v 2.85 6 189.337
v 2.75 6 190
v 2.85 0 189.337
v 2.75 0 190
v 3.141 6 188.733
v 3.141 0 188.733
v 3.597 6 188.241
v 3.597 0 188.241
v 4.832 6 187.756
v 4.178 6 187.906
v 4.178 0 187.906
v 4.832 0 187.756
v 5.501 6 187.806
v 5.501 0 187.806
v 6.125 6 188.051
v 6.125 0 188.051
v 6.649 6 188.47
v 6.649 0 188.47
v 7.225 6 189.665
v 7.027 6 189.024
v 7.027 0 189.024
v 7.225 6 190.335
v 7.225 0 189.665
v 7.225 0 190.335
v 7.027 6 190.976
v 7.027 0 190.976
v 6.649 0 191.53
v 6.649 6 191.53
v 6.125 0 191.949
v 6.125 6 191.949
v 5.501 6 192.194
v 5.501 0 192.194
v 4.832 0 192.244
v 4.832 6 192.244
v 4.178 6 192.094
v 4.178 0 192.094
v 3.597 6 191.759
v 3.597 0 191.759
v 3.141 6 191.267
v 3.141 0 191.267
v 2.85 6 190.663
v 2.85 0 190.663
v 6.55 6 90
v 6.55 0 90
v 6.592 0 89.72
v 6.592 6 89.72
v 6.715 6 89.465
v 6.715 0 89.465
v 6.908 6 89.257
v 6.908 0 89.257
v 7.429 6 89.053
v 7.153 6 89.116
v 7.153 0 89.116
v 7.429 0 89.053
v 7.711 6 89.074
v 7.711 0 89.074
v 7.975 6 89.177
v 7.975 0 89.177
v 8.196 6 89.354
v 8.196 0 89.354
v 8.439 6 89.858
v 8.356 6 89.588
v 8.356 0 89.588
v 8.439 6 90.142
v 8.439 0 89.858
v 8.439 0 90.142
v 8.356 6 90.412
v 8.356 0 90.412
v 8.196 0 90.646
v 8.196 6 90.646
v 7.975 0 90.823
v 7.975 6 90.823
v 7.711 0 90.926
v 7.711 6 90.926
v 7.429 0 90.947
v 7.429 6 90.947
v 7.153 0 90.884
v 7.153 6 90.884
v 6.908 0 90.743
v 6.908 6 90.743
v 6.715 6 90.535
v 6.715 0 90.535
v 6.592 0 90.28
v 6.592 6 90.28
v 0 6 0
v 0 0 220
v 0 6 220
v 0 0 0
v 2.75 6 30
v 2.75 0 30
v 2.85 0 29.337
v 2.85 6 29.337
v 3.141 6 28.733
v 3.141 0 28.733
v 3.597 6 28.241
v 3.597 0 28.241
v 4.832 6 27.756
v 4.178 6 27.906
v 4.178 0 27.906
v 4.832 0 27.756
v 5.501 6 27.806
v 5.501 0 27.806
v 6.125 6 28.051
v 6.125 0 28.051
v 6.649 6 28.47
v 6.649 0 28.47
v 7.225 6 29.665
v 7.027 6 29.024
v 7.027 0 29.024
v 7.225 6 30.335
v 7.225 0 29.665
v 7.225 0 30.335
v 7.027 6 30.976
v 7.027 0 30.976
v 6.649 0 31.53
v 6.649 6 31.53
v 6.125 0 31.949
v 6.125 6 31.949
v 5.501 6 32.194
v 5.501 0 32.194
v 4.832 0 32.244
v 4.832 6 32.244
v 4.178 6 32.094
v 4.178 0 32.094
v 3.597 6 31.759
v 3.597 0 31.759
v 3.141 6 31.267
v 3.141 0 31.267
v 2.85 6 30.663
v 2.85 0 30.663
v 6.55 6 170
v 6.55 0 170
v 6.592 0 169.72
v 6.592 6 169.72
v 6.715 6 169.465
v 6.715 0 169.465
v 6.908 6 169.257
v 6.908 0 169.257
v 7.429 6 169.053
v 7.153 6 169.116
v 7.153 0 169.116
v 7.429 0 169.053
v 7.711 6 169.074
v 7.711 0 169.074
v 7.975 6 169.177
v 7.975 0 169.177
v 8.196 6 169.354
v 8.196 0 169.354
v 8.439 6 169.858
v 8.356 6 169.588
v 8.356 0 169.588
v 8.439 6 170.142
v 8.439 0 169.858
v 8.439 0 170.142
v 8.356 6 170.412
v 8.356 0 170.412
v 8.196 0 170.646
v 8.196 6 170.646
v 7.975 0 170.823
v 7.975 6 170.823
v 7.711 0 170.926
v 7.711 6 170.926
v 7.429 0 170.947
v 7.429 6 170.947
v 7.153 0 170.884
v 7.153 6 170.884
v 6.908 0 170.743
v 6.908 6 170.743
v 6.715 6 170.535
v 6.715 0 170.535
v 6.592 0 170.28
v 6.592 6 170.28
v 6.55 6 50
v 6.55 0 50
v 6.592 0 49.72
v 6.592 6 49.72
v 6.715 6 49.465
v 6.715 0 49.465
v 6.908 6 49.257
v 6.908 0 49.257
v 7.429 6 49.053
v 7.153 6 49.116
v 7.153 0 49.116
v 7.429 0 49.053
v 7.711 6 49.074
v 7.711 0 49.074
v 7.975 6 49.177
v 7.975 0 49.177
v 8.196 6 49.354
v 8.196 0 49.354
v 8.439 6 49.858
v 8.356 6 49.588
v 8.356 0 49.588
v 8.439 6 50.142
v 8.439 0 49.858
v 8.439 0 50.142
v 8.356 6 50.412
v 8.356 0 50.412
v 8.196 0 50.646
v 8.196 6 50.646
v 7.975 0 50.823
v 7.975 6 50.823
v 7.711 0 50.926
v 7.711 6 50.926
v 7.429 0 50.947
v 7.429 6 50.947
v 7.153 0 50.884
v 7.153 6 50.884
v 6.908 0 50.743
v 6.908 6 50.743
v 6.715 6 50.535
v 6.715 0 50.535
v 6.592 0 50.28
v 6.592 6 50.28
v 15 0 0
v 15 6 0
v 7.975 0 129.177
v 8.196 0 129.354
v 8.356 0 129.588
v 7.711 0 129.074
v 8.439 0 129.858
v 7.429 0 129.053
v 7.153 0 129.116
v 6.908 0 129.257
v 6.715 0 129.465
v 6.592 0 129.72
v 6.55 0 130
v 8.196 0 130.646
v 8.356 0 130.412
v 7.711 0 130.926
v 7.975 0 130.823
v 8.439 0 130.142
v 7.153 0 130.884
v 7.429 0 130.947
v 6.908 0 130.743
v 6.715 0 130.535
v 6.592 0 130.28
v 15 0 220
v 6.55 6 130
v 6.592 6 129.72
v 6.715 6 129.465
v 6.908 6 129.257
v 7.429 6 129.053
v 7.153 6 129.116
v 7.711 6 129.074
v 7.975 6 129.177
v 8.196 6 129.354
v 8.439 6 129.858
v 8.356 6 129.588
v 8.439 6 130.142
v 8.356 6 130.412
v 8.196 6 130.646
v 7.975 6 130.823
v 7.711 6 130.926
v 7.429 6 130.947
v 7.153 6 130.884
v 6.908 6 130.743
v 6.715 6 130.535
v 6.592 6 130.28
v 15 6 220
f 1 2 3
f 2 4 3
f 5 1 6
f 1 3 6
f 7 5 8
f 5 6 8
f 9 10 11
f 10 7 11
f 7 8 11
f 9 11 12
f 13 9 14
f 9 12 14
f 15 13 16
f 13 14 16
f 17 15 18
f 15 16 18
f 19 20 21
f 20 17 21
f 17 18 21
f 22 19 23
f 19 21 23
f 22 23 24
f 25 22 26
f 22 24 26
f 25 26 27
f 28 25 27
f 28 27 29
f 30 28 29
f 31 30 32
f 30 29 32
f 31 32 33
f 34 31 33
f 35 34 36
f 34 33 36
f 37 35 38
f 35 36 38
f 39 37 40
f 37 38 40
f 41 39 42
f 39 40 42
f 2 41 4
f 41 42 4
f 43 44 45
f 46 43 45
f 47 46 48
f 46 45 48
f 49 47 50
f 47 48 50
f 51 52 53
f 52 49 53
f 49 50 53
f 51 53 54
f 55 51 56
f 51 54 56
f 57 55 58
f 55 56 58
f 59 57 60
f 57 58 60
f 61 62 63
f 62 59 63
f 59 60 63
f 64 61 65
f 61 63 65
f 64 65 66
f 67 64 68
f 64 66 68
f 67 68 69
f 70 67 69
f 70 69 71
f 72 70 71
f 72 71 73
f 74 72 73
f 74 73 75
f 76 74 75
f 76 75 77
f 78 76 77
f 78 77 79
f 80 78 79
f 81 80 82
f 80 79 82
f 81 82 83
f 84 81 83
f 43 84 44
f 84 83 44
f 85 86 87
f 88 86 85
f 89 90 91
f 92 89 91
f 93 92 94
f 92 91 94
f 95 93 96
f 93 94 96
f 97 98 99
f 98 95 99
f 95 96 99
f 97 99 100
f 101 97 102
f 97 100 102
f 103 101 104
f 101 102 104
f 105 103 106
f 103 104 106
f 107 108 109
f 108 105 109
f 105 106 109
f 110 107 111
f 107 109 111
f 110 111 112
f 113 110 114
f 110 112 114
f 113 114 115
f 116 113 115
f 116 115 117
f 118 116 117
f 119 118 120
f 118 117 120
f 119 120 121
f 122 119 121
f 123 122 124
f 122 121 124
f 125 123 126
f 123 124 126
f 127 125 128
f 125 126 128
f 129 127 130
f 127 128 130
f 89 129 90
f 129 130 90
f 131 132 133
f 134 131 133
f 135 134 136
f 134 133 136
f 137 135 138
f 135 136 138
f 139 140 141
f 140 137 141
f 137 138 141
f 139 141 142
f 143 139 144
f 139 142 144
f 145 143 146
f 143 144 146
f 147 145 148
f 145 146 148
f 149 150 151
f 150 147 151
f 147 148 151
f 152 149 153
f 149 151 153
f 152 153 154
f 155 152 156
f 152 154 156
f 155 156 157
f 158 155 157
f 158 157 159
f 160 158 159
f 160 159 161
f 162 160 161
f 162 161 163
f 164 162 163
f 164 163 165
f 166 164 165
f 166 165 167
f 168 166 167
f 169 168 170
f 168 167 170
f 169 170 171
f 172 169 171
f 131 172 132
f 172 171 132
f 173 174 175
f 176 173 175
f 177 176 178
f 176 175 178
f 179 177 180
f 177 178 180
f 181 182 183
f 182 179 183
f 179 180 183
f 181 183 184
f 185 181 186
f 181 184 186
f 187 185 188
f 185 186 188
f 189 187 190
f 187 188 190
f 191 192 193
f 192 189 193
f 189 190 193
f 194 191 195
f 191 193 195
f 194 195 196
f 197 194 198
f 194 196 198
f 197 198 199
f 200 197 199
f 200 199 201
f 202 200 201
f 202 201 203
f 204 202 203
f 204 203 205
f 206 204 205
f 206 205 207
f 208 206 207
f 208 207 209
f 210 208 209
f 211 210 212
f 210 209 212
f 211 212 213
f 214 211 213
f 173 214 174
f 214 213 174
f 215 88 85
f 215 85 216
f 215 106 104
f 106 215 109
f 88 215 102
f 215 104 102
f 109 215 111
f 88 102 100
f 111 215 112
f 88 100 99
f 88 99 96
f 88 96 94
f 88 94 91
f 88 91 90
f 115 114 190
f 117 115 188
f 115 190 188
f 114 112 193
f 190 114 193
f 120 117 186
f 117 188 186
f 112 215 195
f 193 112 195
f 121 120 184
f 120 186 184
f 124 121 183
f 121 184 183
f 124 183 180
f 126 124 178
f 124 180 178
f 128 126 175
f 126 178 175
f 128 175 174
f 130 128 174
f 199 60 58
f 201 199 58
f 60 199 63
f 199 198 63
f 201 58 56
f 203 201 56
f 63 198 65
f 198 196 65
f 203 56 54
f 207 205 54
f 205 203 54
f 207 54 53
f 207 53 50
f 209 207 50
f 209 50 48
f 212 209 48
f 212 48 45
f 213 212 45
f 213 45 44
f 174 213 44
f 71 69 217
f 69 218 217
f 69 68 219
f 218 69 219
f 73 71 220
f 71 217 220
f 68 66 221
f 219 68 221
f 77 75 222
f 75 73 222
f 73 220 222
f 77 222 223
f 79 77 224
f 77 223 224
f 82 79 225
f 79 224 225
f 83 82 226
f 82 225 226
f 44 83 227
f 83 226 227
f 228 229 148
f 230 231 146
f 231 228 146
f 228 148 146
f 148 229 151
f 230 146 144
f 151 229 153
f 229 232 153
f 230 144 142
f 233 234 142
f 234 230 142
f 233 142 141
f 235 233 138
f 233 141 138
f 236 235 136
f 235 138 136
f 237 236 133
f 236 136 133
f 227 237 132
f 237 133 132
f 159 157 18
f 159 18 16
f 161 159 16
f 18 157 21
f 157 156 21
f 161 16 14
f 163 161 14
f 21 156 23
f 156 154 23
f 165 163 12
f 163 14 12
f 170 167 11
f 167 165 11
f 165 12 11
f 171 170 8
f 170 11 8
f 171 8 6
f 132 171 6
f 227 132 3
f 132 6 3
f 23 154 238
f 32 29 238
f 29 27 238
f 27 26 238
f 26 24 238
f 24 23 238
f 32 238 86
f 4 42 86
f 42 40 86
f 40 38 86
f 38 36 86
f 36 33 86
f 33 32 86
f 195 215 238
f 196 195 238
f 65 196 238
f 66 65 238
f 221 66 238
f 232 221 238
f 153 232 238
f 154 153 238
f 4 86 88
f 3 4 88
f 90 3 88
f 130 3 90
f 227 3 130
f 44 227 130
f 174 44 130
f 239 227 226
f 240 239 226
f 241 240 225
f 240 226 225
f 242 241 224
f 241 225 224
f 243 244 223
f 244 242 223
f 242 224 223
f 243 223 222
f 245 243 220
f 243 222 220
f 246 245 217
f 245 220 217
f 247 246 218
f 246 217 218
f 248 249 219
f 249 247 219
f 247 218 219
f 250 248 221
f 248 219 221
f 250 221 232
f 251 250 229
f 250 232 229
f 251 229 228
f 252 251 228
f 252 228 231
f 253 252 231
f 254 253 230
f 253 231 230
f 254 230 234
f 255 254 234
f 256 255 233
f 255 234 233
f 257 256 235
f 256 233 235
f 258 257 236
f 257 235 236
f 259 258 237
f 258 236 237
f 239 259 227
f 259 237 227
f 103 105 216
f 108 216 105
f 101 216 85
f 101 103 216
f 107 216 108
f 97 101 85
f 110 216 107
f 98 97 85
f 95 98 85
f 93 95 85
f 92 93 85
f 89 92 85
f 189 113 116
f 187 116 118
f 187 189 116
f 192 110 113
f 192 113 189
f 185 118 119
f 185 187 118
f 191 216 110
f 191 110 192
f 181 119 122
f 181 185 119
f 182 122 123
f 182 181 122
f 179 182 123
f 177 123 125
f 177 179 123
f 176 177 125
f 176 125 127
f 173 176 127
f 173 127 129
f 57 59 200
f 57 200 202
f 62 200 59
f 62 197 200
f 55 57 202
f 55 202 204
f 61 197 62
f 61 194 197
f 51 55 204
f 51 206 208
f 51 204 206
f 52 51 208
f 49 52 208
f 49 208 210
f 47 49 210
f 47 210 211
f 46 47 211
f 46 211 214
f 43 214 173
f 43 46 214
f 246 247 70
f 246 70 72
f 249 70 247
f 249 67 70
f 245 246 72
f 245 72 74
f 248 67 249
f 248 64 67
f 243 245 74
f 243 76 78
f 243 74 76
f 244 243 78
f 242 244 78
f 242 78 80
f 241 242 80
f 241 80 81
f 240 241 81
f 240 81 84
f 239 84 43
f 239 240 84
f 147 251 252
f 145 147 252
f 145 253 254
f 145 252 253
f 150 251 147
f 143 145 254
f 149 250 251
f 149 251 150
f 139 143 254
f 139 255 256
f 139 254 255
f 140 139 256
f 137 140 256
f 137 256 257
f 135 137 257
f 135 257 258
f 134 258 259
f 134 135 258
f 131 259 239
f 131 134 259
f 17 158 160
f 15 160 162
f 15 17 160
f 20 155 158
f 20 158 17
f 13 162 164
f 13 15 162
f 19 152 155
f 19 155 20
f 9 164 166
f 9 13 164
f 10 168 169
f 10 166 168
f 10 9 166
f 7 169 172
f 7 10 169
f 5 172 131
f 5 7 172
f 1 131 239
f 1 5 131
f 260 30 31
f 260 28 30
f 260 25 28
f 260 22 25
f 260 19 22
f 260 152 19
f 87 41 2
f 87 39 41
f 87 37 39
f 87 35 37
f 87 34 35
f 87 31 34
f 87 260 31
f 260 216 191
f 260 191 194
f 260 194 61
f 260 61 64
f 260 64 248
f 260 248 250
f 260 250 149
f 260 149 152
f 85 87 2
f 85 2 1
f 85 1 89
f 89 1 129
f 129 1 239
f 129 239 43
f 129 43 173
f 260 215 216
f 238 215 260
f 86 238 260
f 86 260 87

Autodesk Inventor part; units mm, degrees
ref_plane "YZ Plane" through (0, 0, 0) normal (1, 0, 0) x (0, 1, 0)
ref_plane "XZ Plane" through (0, 0, 0) normal (0, 1, 0) x (-1, 0, 0)
ref_plane "XY Plane" through (0, 0, 0) normal (0, 0, 1) x (1, 0, 0)
sketch "Sketch2" plane through (0, 0, 0) normal (0, 1, 0) x (-1, 0, 0)
  line L0 (0, 0) -> (-15, 0)
  line L1 (-15, 0) -> (-15, 220)
  line L2 (-15, 220) -> (0, 220)
  line L3 (0, 220) -> (0, 0)
  circle A0 centre (-5, 30) radius 2.25
  circle A1 centre (-5, 190) radius 2.25
  circle A2 centre (-7.5, 50) radius 0.95
  circle A3 centre (-7.5, 90) radius 0.95
  circle A4 centre (-7.5, 130) radius 0.95
  circle A5 centre (-7.5, 170) radius 0.95
  dimension "d92" = 10
  dimension "d76" = 15
  dimension "d78" = 30
  dimension "d80" = 5
  dimension "d81" = 4.5
  dimension "d82" = 30
  dimension "d83" = 220
  dimension "d84" = 1.9
  dimension "d85" = 7.5
  dimension "d86" = 20
  dimension "d89" = 40
extrude "Extrusion2" add sketch "Sketch2" along normal blind 6
properties part number "phone_holder_botom_insert" material "Acrylic, Clear"
